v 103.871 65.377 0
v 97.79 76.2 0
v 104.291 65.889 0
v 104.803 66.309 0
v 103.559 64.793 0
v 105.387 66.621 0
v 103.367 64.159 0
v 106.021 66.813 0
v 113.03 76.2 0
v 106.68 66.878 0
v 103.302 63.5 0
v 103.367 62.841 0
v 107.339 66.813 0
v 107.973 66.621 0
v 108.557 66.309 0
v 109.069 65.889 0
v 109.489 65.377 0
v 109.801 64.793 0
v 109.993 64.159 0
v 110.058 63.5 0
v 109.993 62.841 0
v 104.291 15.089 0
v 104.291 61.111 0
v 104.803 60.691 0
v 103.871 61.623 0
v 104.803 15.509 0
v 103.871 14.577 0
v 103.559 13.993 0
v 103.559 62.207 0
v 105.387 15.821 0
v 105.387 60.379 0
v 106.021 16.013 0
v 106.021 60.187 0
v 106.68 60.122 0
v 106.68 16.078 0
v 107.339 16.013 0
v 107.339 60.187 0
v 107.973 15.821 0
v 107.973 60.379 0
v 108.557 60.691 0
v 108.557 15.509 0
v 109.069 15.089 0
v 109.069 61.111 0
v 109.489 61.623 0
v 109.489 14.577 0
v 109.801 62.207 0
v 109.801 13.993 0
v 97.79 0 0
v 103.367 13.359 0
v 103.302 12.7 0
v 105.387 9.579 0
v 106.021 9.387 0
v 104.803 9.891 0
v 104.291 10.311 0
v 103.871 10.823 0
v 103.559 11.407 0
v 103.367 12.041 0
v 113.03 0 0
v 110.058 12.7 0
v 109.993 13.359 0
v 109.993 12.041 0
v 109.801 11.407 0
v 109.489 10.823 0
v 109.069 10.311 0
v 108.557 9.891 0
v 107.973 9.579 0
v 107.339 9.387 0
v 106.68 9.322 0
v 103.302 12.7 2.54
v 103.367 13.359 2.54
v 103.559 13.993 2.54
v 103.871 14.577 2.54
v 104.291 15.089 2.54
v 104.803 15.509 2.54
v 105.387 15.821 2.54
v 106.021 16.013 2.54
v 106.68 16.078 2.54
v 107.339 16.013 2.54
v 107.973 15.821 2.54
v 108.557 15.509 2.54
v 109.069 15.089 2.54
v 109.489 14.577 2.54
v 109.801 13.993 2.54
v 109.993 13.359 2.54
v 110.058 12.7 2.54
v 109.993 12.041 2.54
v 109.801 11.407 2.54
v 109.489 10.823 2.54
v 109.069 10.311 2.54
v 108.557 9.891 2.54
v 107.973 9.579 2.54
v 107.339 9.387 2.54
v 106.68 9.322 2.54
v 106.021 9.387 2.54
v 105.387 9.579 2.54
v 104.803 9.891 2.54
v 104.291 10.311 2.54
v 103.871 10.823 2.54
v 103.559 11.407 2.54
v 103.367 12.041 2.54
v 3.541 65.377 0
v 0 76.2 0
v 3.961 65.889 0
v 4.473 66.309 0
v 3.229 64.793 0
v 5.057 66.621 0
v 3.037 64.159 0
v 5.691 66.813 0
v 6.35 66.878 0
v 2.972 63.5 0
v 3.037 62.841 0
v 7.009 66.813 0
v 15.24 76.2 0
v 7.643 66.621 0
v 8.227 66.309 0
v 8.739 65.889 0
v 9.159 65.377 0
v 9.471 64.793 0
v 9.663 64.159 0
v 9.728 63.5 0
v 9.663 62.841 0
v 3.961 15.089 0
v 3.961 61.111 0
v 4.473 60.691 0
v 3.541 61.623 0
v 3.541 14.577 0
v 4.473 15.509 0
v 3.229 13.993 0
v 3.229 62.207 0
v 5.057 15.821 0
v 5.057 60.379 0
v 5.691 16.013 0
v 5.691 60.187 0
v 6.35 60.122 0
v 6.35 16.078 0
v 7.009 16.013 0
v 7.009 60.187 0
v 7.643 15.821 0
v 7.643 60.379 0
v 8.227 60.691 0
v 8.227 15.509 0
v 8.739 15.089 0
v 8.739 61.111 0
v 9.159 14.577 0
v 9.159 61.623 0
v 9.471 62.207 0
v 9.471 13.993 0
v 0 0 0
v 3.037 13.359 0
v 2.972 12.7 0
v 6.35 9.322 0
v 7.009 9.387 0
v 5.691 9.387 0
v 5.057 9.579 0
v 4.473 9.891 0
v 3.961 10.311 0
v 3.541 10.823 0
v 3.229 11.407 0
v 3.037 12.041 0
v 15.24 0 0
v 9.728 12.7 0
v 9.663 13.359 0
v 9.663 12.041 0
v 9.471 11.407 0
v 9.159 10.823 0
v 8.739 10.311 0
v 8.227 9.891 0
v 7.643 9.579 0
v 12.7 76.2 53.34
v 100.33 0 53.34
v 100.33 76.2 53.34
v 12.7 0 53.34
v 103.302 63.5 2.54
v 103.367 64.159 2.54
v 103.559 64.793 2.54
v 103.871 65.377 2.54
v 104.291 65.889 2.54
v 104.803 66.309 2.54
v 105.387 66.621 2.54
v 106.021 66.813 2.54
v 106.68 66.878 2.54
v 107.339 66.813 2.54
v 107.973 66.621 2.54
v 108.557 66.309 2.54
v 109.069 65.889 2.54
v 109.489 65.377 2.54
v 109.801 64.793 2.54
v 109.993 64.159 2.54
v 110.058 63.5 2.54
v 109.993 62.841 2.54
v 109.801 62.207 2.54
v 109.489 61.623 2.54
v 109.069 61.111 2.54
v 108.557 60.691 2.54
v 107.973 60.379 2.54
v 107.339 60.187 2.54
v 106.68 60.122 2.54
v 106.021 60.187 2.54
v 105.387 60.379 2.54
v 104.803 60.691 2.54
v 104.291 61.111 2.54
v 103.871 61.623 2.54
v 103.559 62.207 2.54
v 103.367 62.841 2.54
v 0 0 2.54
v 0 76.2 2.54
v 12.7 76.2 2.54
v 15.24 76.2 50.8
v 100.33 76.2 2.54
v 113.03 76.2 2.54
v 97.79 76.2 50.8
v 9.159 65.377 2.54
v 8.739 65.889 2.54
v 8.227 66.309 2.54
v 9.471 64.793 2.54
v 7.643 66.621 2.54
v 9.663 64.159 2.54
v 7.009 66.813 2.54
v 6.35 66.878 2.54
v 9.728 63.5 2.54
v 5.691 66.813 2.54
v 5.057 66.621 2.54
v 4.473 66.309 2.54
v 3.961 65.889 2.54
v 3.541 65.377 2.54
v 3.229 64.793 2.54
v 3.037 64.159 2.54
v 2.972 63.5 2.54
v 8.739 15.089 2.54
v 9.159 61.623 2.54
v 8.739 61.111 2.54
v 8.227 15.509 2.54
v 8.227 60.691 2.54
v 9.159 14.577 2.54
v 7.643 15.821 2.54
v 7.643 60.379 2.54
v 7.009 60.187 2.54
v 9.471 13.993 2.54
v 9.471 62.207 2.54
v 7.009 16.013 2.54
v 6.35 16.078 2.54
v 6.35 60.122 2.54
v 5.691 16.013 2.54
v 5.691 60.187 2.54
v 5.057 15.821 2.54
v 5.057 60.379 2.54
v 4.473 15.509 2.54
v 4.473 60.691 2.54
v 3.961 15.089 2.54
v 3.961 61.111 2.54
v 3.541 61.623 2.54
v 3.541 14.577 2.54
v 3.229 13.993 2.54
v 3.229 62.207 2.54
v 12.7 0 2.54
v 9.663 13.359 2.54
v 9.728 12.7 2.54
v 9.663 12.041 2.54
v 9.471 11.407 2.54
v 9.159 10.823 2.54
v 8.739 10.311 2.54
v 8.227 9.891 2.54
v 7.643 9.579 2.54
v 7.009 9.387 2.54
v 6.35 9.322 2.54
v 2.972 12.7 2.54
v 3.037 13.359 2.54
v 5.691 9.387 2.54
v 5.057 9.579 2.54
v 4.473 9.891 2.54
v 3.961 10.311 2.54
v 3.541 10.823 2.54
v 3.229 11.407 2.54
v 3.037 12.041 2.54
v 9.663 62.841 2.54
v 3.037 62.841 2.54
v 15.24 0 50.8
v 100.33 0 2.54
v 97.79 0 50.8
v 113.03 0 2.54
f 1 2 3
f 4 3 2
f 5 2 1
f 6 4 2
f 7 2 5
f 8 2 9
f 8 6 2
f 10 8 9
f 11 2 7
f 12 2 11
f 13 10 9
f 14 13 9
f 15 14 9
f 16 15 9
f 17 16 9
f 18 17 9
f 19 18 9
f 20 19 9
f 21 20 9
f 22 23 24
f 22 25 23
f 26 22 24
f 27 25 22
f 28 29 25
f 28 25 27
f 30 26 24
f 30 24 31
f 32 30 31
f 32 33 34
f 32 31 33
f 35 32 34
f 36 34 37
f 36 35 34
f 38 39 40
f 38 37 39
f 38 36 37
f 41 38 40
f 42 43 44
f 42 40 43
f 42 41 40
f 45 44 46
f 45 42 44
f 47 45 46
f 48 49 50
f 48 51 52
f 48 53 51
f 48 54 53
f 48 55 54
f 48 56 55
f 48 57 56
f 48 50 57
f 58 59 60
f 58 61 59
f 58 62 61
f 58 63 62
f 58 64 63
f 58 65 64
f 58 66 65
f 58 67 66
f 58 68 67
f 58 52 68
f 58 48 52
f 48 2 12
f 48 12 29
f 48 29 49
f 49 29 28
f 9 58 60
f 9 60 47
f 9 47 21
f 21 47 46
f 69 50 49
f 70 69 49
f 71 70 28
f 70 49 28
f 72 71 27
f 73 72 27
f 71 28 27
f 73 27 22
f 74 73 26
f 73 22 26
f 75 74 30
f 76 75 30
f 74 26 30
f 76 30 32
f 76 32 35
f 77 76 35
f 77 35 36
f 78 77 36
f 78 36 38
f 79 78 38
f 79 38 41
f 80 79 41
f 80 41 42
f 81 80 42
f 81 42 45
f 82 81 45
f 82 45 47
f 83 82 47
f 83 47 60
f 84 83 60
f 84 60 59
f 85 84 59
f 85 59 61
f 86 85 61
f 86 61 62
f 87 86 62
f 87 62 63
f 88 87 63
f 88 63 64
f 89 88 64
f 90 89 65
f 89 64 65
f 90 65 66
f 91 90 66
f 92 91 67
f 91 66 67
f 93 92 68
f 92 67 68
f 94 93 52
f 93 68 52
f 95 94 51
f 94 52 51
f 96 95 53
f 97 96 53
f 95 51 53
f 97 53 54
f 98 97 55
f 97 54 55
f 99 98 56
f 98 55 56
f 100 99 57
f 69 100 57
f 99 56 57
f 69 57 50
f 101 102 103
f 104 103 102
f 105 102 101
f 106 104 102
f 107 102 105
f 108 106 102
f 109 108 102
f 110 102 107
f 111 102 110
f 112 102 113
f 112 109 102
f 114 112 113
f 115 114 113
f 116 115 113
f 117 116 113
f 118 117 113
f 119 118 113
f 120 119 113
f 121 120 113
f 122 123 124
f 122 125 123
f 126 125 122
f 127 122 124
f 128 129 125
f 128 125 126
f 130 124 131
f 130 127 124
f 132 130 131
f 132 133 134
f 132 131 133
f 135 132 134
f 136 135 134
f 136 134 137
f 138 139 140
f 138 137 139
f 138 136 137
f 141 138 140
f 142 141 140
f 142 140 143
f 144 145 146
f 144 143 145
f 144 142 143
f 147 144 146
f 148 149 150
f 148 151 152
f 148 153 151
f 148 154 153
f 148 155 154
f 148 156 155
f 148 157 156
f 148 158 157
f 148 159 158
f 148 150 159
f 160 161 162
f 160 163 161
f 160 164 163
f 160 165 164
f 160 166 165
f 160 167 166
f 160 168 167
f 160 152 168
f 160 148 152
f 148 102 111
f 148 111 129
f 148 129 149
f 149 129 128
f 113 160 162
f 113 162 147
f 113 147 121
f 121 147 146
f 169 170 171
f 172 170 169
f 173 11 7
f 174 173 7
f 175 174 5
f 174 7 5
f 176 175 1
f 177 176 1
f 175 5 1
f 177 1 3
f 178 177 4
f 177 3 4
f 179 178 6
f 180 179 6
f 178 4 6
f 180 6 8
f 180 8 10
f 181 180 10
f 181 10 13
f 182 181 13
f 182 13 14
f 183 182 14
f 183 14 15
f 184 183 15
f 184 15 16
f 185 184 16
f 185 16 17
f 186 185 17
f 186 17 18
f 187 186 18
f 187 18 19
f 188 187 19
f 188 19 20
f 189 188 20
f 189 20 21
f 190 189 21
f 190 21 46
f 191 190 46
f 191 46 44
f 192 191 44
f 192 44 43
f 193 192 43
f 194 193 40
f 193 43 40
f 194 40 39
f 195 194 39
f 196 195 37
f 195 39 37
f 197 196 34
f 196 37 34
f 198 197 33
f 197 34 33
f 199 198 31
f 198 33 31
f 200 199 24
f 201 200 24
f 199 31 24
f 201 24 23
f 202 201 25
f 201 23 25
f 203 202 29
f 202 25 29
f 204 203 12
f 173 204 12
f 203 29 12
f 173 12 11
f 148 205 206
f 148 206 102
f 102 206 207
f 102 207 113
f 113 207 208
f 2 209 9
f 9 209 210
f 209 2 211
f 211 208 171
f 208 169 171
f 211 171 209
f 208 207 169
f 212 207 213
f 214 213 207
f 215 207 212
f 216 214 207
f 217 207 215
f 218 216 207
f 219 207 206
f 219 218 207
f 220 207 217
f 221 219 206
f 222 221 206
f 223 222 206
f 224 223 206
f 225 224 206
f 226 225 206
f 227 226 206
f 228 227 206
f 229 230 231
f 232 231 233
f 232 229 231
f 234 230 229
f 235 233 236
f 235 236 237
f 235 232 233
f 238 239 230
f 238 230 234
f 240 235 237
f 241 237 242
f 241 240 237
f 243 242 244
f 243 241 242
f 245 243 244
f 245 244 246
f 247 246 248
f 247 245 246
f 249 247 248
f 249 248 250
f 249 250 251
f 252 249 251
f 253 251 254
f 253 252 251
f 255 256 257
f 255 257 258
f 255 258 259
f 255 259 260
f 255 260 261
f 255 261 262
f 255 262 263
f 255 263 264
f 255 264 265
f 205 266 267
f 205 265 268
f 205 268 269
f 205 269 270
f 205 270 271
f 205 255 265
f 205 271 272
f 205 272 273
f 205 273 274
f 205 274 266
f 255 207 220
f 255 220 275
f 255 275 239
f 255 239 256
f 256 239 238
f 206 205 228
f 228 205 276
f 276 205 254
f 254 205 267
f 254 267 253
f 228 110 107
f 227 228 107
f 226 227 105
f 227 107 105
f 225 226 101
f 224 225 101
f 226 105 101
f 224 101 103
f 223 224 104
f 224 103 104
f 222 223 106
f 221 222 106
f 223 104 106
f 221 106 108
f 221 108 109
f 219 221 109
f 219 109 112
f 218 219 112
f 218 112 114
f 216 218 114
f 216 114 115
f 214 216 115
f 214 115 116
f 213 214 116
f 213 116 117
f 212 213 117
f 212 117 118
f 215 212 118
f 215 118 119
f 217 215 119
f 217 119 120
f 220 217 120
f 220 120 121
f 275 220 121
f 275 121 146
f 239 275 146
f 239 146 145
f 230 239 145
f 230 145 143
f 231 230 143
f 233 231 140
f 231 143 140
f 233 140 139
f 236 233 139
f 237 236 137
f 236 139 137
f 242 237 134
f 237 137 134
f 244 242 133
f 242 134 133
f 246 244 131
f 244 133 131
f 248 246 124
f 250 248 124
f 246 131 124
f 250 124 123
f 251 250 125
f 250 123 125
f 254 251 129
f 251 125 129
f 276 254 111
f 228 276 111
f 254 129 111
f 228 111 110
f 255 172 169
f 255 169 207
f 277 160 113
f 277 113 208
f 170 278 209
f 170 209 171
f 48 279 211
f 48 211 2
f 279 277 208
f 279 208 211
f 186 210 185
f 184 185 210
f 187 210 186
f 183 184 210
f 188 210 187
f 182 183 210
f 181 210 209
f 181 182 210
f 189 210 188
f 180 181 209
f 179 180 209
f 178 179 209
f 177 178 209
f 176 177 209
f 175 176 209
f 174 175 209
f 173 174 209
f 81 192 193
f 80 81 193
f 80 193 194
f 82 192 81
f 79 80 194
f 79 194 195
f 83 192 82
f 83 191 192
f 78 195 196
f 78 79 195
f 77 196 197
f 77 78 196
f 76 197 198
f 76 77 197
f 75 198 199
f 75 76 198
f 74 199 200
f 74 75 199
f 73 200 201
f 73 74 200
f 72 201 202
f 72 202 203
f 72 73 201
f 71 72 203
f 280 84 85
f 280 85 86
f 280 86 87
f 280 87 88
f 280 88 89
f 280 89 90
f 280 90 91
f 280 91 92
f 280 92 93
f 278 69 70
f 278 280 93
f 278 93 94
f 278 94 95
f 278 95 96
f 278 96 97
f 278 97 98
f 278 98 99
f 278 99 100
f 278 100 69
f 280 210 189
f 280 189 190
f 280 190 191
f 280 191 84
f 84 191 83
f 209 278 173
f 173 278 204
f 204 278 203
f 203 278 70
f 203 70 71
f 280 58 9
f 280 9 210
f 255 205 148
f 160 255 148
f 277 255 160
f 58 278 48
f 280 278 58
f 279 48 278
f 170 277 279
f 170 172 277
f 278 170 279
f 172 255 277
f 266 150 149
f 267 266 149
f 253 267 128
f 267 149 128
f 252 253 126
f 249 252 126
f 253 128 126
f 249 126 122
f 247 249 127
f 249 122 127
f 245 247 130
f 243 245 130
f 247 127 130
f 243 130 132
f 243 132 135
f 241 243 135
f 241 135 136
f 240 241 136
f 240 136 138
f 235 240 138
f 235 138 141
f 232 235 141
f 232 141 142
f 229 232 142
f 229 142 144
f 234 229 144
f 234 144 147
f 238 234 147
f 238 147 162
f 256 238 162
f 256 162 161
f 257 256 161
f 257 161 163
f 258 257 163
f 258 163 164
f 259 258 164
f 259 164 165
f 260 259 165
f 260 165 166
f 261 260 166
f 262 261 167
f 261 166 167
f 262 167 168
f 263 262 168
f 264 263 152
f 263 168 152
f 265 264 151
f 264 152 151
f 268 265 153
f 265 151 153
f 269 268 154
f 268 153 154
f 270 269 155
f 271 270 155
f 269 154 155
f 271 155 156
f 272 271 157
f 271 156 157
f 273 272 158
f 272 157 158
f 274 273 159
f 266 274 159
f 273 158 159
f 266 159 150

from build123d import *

# Parameters (mm, degrees)
F1_DEPTH = 76.2
F3_D     = 6.7564


with BuildPart() as f1:
    # F0 (on Front) → F1 (new body)
    with BuildSketch(Plane.XZ):
        Polygon((0, 2.54), (0, 0), (15.24, 0), (15.24, 50.8), (97.79, 50.8), (97.79, 0), (113.03, 0), (113.03, 2.54), (100.33, 2.54), (100.33, 53.34), (12.7, 53.34), (12.7, 2.54), align=None)
    extrude(amount=-F1_DEPTH)

    # F3 (through all)
    with Locations(Plane.XY.offset(2.54)):
        with Locations((6.35, 63.5), (6.35, 12.7), (106.68, 12.7), (106.68, 63.5)):
            Hole(F3_D / 2)


solid = f1.part
